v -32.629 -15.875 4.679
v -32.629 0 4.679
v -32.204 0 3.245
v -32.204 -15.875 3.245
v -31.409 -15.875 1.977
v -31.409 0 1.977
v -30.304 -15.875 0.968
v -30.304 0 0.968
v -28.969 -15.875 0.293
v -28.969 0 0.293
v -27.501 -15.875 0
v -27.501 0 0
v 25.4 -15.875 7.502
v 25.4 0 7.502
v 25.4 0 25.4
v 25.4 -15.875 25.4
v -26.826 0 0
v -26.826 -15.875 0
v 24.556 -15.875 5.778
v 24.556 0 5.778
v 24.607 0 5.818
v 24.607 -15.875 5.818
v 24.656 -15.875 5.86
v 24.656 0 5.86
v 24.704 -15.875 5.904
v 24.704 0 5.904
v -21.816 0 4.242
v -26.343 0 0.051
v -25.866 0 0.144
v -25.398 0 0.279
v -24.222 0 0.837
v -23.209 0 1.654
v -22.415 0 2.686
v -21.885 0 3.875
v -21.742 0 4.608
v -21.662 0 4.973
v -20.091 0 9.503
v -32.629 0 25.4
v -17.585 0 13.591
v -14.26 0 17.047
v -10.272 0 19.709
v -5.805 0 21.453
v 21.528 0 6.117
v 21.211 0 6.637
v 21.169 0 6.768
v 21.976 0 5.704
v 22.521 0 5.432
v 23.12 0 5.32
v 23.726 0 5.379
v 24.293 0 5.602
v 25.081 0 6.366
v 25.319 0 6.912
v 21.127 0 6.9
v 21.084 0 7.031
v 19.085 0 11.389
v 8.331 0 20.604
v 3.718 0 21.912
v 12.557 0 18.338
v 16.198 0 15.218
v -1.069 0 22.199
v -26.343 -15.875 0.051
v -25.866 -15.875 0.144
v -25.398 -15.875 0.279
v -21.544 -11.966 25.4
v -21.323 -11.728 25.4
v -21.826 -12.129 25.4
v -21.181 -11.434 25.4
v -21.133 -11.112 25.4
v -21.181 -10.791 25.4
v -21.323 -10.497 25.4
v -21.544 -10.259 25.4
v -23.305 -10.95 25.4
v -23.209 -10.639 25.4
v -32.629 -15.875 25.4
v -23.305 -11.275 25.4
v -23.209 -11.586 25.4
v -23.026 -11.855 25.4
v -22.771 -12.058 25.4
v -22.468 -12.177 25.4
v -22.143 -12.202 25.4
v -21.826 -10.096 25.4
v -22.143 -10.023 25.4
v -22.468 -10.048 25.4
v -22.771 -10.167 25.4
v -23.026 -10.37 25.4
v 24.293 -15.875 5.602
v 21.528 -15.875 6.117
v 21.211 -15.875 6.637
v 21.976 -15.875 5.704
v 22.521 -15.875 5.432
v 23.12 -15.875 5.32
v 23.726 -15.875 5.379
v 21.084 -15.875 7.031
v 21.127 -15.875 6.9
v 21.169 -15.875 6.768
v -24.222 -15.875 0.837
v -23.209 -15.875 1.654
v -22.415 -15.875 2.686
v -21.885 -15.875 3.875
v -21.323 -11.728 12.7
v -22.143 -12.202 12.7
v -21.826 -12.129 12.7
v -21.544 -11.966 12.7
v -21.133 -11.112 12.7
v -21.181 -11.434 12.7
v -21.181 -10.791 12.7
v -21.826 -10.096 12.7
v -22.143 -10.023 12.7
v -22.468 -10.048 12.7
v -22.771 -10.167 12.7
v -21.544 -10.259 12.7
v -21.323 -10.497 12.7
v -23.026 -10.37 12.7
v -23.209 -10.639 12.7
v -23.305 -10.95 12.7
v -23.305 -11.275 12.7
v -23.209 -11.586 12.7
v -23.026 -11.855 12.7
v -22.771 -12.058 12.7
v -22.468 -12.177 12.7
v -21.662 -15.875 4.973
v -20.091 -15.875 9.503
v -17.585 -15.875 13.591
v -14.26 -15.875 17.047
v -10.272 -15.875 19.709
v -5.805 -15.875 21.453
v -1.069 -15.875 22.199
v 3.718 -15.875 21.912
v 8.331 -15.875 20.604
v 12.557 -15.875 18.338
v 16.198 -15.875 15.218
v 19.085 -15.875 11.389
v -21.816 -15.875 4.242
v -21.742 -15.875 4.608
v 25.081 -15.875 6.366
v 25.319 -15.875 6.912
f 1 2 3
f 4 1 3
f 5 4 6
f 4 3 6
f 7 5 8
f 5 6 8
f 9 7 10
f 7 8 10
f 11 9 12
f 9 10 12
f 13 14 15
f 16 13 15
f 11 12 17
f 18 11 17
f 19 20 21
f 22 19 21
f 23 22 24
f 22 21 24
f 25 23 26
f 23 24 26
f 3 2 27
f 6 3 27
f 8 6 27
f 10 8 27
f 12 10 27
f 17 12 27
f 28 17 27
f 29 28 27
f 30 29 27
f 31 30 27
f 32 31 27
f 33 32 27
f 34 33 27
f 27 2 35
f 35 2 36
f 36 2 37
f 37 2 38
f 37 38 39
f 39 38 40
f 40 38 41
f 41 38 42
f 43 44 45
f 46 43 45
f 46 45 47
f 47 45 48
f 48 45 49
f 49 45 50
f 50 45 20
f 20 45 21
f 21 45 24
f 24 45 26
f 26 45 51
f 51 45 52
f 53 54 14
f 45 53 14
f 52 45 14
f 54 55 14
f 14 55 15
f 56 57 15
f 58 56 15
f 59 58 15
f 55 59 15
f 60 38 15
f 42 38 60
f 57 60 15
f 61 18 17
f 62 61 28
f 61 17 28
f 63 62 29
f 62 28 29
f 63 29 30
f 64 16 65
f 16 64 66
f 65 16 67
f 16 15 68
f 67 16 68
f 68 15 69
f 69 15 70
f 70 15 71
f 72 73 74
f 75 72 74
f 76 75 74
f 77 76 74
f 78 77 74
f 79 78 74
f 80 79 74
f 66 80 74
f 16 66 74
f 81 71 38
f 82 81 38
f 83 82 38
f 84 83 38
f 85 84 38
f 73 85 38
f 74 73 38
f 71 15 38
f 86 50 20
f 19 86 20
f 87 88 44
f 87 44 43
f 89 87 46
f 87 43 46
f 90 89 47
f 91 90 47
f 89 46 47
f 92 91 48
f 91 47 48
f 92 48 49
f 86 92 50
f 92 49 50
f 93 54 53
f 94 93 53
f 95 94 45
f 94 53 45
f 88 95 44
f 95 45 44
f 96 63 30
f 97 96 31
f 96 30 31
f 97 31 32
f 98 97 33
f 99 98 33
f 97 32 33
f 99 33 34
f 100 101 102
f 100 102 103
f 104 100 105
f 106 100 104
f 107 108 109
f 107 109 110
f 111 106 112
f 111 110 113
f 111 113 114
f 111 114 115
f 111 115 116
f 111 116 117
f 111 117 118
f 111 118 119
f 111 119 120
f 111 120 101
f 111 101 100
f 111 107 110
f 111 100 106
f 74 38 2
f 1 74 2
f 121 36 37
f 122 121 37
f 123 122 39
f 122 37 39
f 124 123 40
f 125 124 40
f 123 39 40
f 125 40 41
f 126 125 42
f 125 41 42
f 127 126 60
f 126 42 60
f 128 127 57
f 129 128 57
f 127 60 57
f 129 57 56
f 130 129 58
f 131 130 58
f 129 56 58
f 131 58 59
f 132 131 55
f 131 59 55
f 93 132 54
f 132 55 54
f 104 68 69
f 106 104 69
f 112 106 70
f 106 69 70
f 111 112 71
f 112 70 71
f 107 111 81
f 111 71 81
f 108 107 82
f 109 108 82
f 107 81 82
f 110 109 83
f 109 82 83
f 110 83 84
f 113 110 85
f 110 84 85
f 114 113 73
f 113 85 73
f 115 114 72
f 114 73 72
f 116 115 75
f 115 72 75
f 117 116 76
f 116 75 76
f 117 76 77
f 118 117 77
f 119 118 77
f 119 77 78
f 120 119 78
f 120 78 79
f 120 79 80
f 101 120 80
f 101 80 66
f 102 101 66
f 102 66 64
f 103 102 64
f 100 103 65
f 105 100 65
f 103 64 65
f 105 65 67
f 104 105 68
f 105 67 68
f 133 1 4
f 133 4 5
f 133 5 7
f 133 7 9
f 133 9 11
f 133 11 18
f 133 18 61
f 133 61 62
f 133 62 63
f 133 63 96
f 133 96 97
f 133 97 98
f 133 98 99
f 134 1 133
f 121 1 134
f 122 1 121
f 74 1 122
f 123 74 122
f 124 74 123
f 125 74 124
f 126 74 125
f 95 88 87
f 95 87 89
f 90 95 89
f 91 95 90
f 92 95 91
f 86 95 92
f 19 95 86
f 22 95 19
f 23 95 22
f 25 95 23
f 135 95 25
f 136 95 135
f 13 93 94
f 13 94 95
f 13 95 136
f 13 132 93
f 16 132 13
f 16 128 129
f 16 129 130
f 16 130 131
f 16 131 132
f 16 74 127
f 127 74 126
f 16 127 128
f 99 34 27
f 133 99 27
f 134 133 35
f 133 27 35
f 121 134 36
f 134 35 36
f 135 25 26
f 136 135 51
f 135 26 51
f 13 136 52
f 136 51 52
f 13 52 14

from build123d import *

# Parameters (mm, degrees)
F1_DEPTH = 15.875
F2_R     = 1.0922
F3_DEPTH = 12.7


# Not quite as in the source:
# - ends of sketch curves that miss each other by under 0.0002 mm in the source are joined


with BuildPart() as f1:
    # F0 (on Front) → F1 (new body)
    with BuildSketch(Plane.XZ):
        with BuildLine():
            ThreePointArc((21.0836389118, 7.0307037512), (21.1482213946, 6.8339854292), (21.2109684651, 6.6366739991))
            ThreePointArc((21.2109684651, 6.6366739991), (22.5210215532, 5.4318172042), (24.2927235367, 5.6020848515))
            Line((24.2927235367, 5.6020848515), (24.5564028335, 5.7779212439))
            ThreePointArc((24.5564028335, 5.7779212439), (24.6317726398, 5.83924537), (24.7043401509, 5.9038612541))
            ThreePointArc((24.7043401509, 5.9038612541), (24.1693958795, 7.8102690619), (23.4875772319, 9.6692148479))
            ThreePointArc((23.4875772319, 9.6692148479), (21.6017035502, 8.9730623402), (21.0836389118, 7.0307037512))
        make_face()
        with BuildLine():
            ThreePointArc((-25.3984668781, 0.2790703183), (-23.2092642977, 1.6544209311), (-21.8846396204, 3.8746836882))
            ThreePointArc((-21.8846396204, 3.8746836882), (-21.7800085202, 4.4251388519), (-21.6615343316, 4.9727814551))
            ThreePointArc((-21.6615343316, 4.9727814551), (-21.6412555699, 5.2455472098), (-21.6344904646, 5.5189820621))
            ThreePointArc((-21.6344904646, 5.5189820621), (-22.1206425964, 7.786095443), (-23.4936109358, 9.6545453128))
            ThreePointArc((-23.4936109358, 9.6545453128), (-24.8914383088, 5.057301545), (-25.3984668781, 0.2790703183))
        make_face()
        with BuildLine():
            Line((0, 25.4), (0, 22.225))
            ThreePointArc((0, 22.225), (12.9940993172, 18.0306408077), (21.0836389118, 7.0307037512))
            ThreePointArc((21.0836389118, 7.0307037512), (21.6017035502, 8.9730623402), (23.4875772319, 9.6692148479))
            ThreePointArc((23.4875772319, 9.6692148479), (14.1343896731, 21.1040050362), (0, 25.4))
        make_face()
        with BuildLine():
            ThreePointArc((-21.6615343316, 4.9727814551), (-13.8461286495, 17.3849172106), (0, 22.225))
            Line((0, 22.225), (0, 25.4))
            ThreePointArc((0, 25.4), (-14.1409785562, 21.099590647), (-23.4936109358, 9.6545453128))
            ThreePointArc((-23.4936109358, 9.6545453128), (-22.1206425964, 7.786095443), (-21.6344904646, 5.5189820621))
            ThreePointArc((-21.6344904646, 5.5189820621), (-21.6412555699, 5.2455472098), (-21.6615343316, 4.9727814551))
        make_face()
        with BuildLine():
            ThreePointArc((-26.8263954087, 0), (-26.1032119587, 0.0923630453), (-25.3984668781, 0.2790703183))
            ThreePointArc((-25.3984668781, 0.2790703183), (-24.8914383088, 5.057301545), (-23.4936109358, 9.6545453128))
            ThreePointArc((-23.4936109358, 9.6545453128), (-29.0403261825, 10.7200919312), (-32.6289507574, 6.3585310541))
            Line((-32.6289507574, 6.3585310541), (-32.6289507574, 4.6794330701))
            ThreePointArc((-32.6289507574, 4.6794330701), (-30.8909302127, 1.4347070449), (-27.501154691, 0))
            Line((-27.501154691, 0), (-26.8263954087, 0))
        make_face()
        with BuildLine():
            ThreePointArc((23.4875772319, 9.6692148479), (24.1693958795, 7.8102690619), (24.7043401509, 5.9038612541))
            ThreePointArc((24.7043401509, 5.9038612541), (25.2185681707, 6.630615454), (25.4000290489, 7.5022082908))
            ThreePointArc((25.4000290489, 7.5022082908), (24.8535428533, 8.9473198237), (23.4875772319, 9.6692148479))
        make_face()
        with BuildLine():
            ThreePointArc((23.4875772319, 9.6692148479), (24.8535428533, 8.9473198237), (25.4000290489, 7.5022082908))
            Line((25.4000290489, 7.5022082908), (25.4, 25.4))
            Line((25.4, 25.4), (0, 25.4))
            ThreePointArc((0, 25.4), (14.1343896731, 21.1040050362), (23.4875772319, 9.6692148479))
        make_face()
        with BuildLine():
            ThreePointArc((-23.4936109358, 9.6545453128), (-14.1409785562, 21.099590647), (0, 25.4))
            Line((0, 25.4), (-25.3993433231, 25.4))
            Line((-25.3993433231, 25.4), (-32.6289507574, 25.4))
            Line((-32.6289507574, 25.4), (-32.6289507574, 6.3585310541))
            ThreePointArc((-32.6289507574, 6.3585310541), (-29.0403261825, 10.7200919312), (-23.4936109358, 9.6545453128))
        make_face()
    extrude(amount=F1_DEPTH)

    # F2 (on face) → F3 (cut)
    with BuildSketch(Plane.XY.offset(25.4)):
        with Locations((-22.225, -11.1125)):
            Circle(F2_R)
    extrude(amount=-F3_DEPTH, mode=Mode.SUBTRACT)


solid = f1.part
